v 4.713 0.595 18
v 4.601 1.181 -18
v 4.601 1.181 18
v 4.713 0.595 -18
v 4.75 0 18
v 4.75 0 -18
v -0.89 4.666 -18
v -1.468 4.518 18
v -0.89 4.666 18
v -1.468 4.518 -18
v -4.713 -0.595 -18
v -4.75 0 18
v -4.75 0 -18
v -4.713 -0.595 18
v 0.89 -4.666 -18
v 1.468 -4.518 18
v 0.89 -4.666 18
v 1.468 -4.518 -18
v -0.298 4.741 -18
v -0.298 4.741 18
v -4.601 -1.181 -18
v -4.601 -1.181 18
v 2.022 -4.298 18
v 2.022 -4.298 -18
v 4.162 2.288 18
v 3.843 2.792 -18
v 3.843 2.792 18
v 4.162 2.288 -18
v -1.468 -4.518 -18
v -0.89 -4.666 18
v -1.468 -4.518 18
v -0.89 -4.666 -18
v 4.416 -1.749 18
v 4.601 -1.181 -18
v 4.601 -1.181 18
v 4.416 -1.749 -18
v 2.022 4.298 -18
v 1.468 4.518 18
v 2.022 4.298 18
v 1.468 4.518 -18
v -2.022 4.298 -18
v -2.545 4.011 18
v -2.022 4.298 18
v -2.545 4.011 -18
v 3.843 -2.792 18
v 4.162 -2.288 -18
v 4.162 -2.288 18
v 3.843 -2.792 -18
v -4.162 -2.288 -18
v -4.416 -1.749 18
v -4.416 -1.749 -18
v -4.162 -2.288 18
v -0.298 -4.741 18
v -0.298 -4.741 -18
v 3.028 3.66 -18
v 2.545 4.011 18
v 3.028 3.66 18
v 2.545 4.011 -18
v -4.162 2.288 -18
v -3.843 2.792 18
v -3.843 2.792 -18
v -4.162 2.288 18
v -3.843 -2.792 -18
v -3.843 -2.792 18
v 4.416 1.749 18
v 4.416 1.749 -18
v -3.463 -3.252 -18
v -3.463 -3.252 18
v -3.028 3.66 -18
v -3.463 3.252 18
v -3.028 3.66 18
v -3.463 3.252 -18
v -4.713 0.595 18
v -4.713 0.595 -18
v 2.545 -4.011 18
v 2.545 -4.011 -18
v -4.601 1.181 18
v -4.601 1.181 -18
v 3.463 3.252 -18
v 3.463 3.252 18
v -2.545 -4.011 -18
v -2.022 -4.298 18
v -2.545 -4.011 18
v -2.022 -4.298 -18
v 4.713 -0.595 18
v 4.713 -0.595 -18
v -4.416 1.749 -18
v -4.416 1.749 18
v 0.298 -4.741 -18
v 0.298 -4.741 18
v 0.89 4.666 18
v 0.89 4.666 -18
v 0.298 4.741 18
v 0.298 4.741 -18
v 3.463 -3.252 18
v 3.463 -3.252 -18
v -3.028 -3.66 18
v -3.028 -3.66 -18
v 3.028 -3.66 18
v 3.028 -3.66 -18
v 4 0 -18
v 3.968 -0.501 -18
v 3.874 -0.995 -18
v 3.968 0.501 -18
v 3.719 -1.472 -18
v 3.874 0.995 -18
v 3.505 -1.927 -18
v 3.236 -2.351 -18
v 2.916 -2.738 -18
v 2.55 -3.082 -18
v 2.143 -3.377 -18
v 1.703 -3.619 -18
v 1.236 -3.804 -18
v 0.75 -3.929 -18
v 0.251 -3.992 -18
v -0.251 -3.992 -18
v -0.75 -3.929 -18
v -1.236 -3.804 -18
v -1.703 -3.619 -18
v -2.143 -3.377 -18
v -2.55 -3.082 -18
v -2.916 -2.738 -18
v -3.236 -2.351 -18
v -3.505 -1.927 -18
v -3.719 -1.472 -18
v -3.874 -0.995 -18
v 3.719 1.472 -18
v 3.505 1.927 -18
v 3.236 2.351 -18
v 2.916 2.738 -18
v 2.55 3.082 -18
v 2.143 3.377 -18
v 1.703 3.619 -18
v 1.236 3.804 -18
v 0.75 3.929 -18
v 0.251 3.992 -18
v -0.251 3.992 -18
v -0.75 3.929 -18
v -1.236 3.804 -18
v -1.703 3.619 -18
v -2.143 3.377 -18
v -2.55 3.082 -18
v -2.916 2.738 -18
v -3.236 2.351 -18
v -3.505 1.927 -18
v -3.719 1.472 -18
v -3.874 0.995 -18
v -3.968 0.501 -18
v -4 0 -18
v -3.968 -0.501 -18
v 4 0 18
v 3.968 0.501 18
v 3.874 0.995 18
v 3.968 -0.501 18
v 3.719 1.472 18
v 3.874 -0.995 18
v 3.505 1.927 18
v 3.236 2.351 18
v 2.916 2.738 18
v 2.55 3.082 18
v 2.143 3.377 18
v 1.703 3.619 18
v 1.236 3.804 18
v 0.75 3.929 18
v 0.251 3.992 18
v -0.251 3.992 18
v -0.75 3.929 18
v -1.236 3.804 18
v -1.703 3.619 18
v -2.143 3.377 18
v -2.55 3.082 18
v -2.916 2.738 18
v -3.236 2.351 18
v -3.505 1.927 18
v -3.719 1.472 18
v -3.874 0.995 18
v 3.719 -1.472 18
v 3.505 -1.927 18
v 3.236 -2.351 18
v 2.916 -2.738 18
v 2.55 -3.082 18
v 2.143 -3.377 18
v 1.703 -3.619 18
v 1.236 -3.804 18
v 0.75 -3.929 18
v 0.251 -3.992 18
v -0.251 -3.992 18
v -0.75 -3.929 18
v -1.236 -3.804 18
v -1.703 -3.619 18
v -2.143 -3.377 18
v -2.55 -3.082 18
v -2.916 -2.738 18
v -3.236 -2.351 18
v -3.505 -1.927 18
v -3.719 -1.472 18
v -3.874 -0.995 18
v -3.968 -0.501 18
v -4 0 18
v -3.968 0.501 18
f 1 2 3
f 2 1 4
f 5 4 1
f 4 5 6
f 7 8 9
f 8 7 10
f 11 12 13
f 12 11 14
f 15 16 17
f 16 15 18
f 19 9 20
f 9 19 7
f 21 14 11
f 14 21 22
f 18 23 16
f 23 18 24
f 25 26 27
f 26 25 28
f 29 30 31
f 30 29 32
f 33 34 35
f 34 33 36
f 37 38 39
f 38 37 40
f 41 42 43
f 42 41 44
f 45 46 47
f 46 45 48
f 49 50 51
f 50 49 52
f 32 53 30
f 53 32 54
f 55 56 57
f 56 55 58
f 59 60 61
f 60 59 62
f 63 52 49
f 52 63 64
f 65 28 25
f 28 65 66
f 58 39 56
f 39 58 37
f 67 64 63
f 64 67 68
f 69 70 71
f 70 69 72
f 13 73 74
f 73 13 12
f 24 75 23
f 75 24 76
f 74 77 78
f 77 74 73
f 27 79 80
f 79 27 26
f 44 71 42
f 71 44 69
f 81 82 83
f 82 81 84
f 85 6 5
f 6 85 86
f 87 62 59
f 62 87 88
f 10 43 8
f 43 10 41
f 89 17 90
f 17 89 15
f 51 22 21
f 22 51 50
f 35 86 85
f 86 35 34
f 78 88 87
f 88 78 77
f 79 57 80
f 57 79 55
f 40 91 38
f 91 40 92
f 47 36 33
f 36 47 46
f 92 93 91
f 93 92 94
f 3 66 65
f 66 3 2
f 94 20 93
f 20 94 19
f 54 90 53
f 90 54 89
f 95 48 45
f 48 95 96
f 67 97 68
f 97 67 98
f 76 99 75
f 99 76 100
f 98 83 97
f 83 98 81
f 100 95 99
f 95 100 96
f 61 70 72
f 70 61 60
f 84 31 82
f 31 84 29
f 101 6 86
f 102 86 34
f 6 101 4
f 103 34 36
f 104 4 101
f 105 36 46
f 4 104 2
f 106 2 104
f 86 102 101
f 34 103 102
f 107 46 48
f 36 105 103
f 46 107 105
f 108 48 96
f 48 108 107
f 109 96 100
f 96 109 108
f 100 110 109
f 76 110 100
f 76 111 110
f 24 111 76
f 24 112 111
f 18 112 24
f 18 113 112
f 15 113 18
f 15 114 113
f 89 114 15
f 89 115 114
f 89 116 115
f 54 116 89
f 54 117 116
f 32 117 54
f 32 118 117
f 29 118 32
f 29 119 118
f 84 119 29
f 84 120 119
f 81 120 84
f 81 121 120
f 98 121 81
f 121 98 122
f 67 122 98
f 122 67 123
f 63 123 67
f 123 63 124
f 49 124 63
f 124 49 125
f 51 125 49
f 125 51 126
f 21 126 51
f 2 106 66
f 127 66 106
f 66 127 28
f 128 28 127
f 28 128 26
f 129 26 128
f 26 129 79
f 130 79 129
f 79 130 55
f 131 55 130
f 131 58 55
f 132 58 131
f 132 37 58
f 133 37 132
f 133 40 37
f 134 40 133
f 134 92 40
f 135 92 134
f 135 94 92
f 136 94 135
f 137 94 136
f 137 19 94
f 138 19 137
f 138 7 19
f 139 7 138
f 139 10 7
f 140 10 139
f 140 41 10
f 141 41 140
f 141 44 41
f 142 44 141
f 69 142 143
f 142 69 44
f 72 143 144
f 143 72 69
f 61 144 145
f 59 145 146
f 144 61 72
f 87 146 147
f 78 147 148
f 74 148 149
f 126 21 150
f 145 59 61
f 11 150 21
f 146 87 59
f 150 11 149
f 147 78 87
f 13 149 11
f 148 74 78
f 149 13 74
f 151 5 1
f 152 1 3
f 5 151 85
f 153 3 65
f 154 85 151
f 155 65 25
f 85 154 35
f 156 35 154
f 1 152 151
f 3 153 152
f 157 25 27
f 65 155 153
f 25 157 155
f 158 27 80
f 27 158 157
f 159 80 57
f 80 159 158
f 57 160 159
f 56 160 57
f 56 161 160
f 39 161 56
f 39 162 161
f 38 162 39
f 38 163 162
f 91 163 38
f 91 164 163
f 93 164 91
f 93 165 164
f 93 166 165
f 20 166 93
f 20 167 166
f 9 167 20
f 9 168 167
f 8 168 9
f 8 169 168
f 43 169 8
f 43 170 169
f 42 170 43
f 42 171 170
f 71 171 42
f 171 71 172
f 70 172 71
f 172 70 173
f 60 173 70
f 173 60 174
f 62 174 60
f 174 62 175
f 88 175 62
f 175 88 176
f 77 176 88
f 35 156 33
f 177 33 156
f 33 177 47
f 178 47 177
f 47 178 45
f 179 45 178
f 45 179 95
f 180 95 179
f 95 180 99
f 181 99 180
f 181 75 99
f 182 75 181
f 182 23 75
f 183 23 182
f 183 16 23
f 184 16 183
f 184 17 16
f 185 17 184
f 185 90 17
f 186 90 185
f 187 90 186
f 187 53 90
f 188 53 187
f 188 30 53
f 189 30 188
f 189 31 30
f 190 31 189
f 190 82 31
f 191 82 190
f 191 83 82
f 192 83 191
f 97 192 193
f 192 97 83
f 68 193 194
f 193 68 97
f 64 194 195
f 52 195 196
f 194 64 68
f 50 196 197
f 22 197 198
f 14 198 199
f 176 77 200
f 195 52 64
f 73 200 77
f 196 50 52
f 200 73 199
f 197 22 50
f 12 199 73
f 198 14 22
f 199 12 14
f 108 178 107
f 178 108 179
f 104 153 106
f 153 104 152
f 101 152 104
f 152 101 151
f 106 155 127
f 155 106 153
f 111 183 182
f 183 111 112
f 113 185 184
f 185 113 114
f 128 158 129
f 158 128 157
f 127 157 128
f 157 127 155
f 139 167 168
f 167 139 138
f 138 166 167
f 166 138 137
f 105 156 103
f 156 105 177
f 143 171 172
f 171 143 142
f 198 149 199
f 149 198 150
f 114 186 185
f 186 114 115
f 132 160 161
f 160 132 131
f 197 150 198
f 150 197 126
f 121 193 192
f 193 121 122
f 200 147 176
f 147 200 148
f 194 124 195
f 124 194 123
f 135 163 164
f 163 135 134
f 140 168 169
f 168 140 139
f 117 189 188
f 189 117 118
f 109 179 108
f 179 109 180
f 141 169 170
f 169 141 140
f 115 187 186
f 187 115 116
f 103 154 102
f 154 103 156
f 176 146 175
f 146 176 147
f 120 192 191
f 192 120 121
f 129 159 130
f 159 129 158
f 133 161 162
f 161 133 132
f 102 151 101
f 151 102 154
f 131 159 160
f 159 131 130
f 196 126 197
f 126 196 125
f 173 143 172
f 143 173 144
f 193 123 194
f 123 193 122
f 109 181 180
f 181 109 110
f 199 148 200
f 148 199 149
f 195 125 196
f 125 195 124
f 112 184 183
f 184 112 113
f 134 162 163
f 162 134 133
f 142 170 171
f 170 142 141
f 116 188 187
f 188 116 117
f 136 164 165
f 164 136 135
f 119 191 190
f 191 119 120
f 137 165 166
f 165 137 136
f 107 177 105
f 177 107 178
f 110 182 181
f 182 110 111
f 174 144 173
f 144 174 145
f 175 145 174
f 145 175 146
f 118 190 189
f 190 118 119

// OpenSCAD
$fn = 50;


difference() {
	union() {
		translate(v = [0, 0, -18.0000000000]) {
			cylinder(h = 36, r = 4.7500000000);
		}
	}
	union() {
		translate(v = [0, 0, -100.0000000000]) {
			cylinder(h = 200, r = 4.0000000000);
		}
	}
}
